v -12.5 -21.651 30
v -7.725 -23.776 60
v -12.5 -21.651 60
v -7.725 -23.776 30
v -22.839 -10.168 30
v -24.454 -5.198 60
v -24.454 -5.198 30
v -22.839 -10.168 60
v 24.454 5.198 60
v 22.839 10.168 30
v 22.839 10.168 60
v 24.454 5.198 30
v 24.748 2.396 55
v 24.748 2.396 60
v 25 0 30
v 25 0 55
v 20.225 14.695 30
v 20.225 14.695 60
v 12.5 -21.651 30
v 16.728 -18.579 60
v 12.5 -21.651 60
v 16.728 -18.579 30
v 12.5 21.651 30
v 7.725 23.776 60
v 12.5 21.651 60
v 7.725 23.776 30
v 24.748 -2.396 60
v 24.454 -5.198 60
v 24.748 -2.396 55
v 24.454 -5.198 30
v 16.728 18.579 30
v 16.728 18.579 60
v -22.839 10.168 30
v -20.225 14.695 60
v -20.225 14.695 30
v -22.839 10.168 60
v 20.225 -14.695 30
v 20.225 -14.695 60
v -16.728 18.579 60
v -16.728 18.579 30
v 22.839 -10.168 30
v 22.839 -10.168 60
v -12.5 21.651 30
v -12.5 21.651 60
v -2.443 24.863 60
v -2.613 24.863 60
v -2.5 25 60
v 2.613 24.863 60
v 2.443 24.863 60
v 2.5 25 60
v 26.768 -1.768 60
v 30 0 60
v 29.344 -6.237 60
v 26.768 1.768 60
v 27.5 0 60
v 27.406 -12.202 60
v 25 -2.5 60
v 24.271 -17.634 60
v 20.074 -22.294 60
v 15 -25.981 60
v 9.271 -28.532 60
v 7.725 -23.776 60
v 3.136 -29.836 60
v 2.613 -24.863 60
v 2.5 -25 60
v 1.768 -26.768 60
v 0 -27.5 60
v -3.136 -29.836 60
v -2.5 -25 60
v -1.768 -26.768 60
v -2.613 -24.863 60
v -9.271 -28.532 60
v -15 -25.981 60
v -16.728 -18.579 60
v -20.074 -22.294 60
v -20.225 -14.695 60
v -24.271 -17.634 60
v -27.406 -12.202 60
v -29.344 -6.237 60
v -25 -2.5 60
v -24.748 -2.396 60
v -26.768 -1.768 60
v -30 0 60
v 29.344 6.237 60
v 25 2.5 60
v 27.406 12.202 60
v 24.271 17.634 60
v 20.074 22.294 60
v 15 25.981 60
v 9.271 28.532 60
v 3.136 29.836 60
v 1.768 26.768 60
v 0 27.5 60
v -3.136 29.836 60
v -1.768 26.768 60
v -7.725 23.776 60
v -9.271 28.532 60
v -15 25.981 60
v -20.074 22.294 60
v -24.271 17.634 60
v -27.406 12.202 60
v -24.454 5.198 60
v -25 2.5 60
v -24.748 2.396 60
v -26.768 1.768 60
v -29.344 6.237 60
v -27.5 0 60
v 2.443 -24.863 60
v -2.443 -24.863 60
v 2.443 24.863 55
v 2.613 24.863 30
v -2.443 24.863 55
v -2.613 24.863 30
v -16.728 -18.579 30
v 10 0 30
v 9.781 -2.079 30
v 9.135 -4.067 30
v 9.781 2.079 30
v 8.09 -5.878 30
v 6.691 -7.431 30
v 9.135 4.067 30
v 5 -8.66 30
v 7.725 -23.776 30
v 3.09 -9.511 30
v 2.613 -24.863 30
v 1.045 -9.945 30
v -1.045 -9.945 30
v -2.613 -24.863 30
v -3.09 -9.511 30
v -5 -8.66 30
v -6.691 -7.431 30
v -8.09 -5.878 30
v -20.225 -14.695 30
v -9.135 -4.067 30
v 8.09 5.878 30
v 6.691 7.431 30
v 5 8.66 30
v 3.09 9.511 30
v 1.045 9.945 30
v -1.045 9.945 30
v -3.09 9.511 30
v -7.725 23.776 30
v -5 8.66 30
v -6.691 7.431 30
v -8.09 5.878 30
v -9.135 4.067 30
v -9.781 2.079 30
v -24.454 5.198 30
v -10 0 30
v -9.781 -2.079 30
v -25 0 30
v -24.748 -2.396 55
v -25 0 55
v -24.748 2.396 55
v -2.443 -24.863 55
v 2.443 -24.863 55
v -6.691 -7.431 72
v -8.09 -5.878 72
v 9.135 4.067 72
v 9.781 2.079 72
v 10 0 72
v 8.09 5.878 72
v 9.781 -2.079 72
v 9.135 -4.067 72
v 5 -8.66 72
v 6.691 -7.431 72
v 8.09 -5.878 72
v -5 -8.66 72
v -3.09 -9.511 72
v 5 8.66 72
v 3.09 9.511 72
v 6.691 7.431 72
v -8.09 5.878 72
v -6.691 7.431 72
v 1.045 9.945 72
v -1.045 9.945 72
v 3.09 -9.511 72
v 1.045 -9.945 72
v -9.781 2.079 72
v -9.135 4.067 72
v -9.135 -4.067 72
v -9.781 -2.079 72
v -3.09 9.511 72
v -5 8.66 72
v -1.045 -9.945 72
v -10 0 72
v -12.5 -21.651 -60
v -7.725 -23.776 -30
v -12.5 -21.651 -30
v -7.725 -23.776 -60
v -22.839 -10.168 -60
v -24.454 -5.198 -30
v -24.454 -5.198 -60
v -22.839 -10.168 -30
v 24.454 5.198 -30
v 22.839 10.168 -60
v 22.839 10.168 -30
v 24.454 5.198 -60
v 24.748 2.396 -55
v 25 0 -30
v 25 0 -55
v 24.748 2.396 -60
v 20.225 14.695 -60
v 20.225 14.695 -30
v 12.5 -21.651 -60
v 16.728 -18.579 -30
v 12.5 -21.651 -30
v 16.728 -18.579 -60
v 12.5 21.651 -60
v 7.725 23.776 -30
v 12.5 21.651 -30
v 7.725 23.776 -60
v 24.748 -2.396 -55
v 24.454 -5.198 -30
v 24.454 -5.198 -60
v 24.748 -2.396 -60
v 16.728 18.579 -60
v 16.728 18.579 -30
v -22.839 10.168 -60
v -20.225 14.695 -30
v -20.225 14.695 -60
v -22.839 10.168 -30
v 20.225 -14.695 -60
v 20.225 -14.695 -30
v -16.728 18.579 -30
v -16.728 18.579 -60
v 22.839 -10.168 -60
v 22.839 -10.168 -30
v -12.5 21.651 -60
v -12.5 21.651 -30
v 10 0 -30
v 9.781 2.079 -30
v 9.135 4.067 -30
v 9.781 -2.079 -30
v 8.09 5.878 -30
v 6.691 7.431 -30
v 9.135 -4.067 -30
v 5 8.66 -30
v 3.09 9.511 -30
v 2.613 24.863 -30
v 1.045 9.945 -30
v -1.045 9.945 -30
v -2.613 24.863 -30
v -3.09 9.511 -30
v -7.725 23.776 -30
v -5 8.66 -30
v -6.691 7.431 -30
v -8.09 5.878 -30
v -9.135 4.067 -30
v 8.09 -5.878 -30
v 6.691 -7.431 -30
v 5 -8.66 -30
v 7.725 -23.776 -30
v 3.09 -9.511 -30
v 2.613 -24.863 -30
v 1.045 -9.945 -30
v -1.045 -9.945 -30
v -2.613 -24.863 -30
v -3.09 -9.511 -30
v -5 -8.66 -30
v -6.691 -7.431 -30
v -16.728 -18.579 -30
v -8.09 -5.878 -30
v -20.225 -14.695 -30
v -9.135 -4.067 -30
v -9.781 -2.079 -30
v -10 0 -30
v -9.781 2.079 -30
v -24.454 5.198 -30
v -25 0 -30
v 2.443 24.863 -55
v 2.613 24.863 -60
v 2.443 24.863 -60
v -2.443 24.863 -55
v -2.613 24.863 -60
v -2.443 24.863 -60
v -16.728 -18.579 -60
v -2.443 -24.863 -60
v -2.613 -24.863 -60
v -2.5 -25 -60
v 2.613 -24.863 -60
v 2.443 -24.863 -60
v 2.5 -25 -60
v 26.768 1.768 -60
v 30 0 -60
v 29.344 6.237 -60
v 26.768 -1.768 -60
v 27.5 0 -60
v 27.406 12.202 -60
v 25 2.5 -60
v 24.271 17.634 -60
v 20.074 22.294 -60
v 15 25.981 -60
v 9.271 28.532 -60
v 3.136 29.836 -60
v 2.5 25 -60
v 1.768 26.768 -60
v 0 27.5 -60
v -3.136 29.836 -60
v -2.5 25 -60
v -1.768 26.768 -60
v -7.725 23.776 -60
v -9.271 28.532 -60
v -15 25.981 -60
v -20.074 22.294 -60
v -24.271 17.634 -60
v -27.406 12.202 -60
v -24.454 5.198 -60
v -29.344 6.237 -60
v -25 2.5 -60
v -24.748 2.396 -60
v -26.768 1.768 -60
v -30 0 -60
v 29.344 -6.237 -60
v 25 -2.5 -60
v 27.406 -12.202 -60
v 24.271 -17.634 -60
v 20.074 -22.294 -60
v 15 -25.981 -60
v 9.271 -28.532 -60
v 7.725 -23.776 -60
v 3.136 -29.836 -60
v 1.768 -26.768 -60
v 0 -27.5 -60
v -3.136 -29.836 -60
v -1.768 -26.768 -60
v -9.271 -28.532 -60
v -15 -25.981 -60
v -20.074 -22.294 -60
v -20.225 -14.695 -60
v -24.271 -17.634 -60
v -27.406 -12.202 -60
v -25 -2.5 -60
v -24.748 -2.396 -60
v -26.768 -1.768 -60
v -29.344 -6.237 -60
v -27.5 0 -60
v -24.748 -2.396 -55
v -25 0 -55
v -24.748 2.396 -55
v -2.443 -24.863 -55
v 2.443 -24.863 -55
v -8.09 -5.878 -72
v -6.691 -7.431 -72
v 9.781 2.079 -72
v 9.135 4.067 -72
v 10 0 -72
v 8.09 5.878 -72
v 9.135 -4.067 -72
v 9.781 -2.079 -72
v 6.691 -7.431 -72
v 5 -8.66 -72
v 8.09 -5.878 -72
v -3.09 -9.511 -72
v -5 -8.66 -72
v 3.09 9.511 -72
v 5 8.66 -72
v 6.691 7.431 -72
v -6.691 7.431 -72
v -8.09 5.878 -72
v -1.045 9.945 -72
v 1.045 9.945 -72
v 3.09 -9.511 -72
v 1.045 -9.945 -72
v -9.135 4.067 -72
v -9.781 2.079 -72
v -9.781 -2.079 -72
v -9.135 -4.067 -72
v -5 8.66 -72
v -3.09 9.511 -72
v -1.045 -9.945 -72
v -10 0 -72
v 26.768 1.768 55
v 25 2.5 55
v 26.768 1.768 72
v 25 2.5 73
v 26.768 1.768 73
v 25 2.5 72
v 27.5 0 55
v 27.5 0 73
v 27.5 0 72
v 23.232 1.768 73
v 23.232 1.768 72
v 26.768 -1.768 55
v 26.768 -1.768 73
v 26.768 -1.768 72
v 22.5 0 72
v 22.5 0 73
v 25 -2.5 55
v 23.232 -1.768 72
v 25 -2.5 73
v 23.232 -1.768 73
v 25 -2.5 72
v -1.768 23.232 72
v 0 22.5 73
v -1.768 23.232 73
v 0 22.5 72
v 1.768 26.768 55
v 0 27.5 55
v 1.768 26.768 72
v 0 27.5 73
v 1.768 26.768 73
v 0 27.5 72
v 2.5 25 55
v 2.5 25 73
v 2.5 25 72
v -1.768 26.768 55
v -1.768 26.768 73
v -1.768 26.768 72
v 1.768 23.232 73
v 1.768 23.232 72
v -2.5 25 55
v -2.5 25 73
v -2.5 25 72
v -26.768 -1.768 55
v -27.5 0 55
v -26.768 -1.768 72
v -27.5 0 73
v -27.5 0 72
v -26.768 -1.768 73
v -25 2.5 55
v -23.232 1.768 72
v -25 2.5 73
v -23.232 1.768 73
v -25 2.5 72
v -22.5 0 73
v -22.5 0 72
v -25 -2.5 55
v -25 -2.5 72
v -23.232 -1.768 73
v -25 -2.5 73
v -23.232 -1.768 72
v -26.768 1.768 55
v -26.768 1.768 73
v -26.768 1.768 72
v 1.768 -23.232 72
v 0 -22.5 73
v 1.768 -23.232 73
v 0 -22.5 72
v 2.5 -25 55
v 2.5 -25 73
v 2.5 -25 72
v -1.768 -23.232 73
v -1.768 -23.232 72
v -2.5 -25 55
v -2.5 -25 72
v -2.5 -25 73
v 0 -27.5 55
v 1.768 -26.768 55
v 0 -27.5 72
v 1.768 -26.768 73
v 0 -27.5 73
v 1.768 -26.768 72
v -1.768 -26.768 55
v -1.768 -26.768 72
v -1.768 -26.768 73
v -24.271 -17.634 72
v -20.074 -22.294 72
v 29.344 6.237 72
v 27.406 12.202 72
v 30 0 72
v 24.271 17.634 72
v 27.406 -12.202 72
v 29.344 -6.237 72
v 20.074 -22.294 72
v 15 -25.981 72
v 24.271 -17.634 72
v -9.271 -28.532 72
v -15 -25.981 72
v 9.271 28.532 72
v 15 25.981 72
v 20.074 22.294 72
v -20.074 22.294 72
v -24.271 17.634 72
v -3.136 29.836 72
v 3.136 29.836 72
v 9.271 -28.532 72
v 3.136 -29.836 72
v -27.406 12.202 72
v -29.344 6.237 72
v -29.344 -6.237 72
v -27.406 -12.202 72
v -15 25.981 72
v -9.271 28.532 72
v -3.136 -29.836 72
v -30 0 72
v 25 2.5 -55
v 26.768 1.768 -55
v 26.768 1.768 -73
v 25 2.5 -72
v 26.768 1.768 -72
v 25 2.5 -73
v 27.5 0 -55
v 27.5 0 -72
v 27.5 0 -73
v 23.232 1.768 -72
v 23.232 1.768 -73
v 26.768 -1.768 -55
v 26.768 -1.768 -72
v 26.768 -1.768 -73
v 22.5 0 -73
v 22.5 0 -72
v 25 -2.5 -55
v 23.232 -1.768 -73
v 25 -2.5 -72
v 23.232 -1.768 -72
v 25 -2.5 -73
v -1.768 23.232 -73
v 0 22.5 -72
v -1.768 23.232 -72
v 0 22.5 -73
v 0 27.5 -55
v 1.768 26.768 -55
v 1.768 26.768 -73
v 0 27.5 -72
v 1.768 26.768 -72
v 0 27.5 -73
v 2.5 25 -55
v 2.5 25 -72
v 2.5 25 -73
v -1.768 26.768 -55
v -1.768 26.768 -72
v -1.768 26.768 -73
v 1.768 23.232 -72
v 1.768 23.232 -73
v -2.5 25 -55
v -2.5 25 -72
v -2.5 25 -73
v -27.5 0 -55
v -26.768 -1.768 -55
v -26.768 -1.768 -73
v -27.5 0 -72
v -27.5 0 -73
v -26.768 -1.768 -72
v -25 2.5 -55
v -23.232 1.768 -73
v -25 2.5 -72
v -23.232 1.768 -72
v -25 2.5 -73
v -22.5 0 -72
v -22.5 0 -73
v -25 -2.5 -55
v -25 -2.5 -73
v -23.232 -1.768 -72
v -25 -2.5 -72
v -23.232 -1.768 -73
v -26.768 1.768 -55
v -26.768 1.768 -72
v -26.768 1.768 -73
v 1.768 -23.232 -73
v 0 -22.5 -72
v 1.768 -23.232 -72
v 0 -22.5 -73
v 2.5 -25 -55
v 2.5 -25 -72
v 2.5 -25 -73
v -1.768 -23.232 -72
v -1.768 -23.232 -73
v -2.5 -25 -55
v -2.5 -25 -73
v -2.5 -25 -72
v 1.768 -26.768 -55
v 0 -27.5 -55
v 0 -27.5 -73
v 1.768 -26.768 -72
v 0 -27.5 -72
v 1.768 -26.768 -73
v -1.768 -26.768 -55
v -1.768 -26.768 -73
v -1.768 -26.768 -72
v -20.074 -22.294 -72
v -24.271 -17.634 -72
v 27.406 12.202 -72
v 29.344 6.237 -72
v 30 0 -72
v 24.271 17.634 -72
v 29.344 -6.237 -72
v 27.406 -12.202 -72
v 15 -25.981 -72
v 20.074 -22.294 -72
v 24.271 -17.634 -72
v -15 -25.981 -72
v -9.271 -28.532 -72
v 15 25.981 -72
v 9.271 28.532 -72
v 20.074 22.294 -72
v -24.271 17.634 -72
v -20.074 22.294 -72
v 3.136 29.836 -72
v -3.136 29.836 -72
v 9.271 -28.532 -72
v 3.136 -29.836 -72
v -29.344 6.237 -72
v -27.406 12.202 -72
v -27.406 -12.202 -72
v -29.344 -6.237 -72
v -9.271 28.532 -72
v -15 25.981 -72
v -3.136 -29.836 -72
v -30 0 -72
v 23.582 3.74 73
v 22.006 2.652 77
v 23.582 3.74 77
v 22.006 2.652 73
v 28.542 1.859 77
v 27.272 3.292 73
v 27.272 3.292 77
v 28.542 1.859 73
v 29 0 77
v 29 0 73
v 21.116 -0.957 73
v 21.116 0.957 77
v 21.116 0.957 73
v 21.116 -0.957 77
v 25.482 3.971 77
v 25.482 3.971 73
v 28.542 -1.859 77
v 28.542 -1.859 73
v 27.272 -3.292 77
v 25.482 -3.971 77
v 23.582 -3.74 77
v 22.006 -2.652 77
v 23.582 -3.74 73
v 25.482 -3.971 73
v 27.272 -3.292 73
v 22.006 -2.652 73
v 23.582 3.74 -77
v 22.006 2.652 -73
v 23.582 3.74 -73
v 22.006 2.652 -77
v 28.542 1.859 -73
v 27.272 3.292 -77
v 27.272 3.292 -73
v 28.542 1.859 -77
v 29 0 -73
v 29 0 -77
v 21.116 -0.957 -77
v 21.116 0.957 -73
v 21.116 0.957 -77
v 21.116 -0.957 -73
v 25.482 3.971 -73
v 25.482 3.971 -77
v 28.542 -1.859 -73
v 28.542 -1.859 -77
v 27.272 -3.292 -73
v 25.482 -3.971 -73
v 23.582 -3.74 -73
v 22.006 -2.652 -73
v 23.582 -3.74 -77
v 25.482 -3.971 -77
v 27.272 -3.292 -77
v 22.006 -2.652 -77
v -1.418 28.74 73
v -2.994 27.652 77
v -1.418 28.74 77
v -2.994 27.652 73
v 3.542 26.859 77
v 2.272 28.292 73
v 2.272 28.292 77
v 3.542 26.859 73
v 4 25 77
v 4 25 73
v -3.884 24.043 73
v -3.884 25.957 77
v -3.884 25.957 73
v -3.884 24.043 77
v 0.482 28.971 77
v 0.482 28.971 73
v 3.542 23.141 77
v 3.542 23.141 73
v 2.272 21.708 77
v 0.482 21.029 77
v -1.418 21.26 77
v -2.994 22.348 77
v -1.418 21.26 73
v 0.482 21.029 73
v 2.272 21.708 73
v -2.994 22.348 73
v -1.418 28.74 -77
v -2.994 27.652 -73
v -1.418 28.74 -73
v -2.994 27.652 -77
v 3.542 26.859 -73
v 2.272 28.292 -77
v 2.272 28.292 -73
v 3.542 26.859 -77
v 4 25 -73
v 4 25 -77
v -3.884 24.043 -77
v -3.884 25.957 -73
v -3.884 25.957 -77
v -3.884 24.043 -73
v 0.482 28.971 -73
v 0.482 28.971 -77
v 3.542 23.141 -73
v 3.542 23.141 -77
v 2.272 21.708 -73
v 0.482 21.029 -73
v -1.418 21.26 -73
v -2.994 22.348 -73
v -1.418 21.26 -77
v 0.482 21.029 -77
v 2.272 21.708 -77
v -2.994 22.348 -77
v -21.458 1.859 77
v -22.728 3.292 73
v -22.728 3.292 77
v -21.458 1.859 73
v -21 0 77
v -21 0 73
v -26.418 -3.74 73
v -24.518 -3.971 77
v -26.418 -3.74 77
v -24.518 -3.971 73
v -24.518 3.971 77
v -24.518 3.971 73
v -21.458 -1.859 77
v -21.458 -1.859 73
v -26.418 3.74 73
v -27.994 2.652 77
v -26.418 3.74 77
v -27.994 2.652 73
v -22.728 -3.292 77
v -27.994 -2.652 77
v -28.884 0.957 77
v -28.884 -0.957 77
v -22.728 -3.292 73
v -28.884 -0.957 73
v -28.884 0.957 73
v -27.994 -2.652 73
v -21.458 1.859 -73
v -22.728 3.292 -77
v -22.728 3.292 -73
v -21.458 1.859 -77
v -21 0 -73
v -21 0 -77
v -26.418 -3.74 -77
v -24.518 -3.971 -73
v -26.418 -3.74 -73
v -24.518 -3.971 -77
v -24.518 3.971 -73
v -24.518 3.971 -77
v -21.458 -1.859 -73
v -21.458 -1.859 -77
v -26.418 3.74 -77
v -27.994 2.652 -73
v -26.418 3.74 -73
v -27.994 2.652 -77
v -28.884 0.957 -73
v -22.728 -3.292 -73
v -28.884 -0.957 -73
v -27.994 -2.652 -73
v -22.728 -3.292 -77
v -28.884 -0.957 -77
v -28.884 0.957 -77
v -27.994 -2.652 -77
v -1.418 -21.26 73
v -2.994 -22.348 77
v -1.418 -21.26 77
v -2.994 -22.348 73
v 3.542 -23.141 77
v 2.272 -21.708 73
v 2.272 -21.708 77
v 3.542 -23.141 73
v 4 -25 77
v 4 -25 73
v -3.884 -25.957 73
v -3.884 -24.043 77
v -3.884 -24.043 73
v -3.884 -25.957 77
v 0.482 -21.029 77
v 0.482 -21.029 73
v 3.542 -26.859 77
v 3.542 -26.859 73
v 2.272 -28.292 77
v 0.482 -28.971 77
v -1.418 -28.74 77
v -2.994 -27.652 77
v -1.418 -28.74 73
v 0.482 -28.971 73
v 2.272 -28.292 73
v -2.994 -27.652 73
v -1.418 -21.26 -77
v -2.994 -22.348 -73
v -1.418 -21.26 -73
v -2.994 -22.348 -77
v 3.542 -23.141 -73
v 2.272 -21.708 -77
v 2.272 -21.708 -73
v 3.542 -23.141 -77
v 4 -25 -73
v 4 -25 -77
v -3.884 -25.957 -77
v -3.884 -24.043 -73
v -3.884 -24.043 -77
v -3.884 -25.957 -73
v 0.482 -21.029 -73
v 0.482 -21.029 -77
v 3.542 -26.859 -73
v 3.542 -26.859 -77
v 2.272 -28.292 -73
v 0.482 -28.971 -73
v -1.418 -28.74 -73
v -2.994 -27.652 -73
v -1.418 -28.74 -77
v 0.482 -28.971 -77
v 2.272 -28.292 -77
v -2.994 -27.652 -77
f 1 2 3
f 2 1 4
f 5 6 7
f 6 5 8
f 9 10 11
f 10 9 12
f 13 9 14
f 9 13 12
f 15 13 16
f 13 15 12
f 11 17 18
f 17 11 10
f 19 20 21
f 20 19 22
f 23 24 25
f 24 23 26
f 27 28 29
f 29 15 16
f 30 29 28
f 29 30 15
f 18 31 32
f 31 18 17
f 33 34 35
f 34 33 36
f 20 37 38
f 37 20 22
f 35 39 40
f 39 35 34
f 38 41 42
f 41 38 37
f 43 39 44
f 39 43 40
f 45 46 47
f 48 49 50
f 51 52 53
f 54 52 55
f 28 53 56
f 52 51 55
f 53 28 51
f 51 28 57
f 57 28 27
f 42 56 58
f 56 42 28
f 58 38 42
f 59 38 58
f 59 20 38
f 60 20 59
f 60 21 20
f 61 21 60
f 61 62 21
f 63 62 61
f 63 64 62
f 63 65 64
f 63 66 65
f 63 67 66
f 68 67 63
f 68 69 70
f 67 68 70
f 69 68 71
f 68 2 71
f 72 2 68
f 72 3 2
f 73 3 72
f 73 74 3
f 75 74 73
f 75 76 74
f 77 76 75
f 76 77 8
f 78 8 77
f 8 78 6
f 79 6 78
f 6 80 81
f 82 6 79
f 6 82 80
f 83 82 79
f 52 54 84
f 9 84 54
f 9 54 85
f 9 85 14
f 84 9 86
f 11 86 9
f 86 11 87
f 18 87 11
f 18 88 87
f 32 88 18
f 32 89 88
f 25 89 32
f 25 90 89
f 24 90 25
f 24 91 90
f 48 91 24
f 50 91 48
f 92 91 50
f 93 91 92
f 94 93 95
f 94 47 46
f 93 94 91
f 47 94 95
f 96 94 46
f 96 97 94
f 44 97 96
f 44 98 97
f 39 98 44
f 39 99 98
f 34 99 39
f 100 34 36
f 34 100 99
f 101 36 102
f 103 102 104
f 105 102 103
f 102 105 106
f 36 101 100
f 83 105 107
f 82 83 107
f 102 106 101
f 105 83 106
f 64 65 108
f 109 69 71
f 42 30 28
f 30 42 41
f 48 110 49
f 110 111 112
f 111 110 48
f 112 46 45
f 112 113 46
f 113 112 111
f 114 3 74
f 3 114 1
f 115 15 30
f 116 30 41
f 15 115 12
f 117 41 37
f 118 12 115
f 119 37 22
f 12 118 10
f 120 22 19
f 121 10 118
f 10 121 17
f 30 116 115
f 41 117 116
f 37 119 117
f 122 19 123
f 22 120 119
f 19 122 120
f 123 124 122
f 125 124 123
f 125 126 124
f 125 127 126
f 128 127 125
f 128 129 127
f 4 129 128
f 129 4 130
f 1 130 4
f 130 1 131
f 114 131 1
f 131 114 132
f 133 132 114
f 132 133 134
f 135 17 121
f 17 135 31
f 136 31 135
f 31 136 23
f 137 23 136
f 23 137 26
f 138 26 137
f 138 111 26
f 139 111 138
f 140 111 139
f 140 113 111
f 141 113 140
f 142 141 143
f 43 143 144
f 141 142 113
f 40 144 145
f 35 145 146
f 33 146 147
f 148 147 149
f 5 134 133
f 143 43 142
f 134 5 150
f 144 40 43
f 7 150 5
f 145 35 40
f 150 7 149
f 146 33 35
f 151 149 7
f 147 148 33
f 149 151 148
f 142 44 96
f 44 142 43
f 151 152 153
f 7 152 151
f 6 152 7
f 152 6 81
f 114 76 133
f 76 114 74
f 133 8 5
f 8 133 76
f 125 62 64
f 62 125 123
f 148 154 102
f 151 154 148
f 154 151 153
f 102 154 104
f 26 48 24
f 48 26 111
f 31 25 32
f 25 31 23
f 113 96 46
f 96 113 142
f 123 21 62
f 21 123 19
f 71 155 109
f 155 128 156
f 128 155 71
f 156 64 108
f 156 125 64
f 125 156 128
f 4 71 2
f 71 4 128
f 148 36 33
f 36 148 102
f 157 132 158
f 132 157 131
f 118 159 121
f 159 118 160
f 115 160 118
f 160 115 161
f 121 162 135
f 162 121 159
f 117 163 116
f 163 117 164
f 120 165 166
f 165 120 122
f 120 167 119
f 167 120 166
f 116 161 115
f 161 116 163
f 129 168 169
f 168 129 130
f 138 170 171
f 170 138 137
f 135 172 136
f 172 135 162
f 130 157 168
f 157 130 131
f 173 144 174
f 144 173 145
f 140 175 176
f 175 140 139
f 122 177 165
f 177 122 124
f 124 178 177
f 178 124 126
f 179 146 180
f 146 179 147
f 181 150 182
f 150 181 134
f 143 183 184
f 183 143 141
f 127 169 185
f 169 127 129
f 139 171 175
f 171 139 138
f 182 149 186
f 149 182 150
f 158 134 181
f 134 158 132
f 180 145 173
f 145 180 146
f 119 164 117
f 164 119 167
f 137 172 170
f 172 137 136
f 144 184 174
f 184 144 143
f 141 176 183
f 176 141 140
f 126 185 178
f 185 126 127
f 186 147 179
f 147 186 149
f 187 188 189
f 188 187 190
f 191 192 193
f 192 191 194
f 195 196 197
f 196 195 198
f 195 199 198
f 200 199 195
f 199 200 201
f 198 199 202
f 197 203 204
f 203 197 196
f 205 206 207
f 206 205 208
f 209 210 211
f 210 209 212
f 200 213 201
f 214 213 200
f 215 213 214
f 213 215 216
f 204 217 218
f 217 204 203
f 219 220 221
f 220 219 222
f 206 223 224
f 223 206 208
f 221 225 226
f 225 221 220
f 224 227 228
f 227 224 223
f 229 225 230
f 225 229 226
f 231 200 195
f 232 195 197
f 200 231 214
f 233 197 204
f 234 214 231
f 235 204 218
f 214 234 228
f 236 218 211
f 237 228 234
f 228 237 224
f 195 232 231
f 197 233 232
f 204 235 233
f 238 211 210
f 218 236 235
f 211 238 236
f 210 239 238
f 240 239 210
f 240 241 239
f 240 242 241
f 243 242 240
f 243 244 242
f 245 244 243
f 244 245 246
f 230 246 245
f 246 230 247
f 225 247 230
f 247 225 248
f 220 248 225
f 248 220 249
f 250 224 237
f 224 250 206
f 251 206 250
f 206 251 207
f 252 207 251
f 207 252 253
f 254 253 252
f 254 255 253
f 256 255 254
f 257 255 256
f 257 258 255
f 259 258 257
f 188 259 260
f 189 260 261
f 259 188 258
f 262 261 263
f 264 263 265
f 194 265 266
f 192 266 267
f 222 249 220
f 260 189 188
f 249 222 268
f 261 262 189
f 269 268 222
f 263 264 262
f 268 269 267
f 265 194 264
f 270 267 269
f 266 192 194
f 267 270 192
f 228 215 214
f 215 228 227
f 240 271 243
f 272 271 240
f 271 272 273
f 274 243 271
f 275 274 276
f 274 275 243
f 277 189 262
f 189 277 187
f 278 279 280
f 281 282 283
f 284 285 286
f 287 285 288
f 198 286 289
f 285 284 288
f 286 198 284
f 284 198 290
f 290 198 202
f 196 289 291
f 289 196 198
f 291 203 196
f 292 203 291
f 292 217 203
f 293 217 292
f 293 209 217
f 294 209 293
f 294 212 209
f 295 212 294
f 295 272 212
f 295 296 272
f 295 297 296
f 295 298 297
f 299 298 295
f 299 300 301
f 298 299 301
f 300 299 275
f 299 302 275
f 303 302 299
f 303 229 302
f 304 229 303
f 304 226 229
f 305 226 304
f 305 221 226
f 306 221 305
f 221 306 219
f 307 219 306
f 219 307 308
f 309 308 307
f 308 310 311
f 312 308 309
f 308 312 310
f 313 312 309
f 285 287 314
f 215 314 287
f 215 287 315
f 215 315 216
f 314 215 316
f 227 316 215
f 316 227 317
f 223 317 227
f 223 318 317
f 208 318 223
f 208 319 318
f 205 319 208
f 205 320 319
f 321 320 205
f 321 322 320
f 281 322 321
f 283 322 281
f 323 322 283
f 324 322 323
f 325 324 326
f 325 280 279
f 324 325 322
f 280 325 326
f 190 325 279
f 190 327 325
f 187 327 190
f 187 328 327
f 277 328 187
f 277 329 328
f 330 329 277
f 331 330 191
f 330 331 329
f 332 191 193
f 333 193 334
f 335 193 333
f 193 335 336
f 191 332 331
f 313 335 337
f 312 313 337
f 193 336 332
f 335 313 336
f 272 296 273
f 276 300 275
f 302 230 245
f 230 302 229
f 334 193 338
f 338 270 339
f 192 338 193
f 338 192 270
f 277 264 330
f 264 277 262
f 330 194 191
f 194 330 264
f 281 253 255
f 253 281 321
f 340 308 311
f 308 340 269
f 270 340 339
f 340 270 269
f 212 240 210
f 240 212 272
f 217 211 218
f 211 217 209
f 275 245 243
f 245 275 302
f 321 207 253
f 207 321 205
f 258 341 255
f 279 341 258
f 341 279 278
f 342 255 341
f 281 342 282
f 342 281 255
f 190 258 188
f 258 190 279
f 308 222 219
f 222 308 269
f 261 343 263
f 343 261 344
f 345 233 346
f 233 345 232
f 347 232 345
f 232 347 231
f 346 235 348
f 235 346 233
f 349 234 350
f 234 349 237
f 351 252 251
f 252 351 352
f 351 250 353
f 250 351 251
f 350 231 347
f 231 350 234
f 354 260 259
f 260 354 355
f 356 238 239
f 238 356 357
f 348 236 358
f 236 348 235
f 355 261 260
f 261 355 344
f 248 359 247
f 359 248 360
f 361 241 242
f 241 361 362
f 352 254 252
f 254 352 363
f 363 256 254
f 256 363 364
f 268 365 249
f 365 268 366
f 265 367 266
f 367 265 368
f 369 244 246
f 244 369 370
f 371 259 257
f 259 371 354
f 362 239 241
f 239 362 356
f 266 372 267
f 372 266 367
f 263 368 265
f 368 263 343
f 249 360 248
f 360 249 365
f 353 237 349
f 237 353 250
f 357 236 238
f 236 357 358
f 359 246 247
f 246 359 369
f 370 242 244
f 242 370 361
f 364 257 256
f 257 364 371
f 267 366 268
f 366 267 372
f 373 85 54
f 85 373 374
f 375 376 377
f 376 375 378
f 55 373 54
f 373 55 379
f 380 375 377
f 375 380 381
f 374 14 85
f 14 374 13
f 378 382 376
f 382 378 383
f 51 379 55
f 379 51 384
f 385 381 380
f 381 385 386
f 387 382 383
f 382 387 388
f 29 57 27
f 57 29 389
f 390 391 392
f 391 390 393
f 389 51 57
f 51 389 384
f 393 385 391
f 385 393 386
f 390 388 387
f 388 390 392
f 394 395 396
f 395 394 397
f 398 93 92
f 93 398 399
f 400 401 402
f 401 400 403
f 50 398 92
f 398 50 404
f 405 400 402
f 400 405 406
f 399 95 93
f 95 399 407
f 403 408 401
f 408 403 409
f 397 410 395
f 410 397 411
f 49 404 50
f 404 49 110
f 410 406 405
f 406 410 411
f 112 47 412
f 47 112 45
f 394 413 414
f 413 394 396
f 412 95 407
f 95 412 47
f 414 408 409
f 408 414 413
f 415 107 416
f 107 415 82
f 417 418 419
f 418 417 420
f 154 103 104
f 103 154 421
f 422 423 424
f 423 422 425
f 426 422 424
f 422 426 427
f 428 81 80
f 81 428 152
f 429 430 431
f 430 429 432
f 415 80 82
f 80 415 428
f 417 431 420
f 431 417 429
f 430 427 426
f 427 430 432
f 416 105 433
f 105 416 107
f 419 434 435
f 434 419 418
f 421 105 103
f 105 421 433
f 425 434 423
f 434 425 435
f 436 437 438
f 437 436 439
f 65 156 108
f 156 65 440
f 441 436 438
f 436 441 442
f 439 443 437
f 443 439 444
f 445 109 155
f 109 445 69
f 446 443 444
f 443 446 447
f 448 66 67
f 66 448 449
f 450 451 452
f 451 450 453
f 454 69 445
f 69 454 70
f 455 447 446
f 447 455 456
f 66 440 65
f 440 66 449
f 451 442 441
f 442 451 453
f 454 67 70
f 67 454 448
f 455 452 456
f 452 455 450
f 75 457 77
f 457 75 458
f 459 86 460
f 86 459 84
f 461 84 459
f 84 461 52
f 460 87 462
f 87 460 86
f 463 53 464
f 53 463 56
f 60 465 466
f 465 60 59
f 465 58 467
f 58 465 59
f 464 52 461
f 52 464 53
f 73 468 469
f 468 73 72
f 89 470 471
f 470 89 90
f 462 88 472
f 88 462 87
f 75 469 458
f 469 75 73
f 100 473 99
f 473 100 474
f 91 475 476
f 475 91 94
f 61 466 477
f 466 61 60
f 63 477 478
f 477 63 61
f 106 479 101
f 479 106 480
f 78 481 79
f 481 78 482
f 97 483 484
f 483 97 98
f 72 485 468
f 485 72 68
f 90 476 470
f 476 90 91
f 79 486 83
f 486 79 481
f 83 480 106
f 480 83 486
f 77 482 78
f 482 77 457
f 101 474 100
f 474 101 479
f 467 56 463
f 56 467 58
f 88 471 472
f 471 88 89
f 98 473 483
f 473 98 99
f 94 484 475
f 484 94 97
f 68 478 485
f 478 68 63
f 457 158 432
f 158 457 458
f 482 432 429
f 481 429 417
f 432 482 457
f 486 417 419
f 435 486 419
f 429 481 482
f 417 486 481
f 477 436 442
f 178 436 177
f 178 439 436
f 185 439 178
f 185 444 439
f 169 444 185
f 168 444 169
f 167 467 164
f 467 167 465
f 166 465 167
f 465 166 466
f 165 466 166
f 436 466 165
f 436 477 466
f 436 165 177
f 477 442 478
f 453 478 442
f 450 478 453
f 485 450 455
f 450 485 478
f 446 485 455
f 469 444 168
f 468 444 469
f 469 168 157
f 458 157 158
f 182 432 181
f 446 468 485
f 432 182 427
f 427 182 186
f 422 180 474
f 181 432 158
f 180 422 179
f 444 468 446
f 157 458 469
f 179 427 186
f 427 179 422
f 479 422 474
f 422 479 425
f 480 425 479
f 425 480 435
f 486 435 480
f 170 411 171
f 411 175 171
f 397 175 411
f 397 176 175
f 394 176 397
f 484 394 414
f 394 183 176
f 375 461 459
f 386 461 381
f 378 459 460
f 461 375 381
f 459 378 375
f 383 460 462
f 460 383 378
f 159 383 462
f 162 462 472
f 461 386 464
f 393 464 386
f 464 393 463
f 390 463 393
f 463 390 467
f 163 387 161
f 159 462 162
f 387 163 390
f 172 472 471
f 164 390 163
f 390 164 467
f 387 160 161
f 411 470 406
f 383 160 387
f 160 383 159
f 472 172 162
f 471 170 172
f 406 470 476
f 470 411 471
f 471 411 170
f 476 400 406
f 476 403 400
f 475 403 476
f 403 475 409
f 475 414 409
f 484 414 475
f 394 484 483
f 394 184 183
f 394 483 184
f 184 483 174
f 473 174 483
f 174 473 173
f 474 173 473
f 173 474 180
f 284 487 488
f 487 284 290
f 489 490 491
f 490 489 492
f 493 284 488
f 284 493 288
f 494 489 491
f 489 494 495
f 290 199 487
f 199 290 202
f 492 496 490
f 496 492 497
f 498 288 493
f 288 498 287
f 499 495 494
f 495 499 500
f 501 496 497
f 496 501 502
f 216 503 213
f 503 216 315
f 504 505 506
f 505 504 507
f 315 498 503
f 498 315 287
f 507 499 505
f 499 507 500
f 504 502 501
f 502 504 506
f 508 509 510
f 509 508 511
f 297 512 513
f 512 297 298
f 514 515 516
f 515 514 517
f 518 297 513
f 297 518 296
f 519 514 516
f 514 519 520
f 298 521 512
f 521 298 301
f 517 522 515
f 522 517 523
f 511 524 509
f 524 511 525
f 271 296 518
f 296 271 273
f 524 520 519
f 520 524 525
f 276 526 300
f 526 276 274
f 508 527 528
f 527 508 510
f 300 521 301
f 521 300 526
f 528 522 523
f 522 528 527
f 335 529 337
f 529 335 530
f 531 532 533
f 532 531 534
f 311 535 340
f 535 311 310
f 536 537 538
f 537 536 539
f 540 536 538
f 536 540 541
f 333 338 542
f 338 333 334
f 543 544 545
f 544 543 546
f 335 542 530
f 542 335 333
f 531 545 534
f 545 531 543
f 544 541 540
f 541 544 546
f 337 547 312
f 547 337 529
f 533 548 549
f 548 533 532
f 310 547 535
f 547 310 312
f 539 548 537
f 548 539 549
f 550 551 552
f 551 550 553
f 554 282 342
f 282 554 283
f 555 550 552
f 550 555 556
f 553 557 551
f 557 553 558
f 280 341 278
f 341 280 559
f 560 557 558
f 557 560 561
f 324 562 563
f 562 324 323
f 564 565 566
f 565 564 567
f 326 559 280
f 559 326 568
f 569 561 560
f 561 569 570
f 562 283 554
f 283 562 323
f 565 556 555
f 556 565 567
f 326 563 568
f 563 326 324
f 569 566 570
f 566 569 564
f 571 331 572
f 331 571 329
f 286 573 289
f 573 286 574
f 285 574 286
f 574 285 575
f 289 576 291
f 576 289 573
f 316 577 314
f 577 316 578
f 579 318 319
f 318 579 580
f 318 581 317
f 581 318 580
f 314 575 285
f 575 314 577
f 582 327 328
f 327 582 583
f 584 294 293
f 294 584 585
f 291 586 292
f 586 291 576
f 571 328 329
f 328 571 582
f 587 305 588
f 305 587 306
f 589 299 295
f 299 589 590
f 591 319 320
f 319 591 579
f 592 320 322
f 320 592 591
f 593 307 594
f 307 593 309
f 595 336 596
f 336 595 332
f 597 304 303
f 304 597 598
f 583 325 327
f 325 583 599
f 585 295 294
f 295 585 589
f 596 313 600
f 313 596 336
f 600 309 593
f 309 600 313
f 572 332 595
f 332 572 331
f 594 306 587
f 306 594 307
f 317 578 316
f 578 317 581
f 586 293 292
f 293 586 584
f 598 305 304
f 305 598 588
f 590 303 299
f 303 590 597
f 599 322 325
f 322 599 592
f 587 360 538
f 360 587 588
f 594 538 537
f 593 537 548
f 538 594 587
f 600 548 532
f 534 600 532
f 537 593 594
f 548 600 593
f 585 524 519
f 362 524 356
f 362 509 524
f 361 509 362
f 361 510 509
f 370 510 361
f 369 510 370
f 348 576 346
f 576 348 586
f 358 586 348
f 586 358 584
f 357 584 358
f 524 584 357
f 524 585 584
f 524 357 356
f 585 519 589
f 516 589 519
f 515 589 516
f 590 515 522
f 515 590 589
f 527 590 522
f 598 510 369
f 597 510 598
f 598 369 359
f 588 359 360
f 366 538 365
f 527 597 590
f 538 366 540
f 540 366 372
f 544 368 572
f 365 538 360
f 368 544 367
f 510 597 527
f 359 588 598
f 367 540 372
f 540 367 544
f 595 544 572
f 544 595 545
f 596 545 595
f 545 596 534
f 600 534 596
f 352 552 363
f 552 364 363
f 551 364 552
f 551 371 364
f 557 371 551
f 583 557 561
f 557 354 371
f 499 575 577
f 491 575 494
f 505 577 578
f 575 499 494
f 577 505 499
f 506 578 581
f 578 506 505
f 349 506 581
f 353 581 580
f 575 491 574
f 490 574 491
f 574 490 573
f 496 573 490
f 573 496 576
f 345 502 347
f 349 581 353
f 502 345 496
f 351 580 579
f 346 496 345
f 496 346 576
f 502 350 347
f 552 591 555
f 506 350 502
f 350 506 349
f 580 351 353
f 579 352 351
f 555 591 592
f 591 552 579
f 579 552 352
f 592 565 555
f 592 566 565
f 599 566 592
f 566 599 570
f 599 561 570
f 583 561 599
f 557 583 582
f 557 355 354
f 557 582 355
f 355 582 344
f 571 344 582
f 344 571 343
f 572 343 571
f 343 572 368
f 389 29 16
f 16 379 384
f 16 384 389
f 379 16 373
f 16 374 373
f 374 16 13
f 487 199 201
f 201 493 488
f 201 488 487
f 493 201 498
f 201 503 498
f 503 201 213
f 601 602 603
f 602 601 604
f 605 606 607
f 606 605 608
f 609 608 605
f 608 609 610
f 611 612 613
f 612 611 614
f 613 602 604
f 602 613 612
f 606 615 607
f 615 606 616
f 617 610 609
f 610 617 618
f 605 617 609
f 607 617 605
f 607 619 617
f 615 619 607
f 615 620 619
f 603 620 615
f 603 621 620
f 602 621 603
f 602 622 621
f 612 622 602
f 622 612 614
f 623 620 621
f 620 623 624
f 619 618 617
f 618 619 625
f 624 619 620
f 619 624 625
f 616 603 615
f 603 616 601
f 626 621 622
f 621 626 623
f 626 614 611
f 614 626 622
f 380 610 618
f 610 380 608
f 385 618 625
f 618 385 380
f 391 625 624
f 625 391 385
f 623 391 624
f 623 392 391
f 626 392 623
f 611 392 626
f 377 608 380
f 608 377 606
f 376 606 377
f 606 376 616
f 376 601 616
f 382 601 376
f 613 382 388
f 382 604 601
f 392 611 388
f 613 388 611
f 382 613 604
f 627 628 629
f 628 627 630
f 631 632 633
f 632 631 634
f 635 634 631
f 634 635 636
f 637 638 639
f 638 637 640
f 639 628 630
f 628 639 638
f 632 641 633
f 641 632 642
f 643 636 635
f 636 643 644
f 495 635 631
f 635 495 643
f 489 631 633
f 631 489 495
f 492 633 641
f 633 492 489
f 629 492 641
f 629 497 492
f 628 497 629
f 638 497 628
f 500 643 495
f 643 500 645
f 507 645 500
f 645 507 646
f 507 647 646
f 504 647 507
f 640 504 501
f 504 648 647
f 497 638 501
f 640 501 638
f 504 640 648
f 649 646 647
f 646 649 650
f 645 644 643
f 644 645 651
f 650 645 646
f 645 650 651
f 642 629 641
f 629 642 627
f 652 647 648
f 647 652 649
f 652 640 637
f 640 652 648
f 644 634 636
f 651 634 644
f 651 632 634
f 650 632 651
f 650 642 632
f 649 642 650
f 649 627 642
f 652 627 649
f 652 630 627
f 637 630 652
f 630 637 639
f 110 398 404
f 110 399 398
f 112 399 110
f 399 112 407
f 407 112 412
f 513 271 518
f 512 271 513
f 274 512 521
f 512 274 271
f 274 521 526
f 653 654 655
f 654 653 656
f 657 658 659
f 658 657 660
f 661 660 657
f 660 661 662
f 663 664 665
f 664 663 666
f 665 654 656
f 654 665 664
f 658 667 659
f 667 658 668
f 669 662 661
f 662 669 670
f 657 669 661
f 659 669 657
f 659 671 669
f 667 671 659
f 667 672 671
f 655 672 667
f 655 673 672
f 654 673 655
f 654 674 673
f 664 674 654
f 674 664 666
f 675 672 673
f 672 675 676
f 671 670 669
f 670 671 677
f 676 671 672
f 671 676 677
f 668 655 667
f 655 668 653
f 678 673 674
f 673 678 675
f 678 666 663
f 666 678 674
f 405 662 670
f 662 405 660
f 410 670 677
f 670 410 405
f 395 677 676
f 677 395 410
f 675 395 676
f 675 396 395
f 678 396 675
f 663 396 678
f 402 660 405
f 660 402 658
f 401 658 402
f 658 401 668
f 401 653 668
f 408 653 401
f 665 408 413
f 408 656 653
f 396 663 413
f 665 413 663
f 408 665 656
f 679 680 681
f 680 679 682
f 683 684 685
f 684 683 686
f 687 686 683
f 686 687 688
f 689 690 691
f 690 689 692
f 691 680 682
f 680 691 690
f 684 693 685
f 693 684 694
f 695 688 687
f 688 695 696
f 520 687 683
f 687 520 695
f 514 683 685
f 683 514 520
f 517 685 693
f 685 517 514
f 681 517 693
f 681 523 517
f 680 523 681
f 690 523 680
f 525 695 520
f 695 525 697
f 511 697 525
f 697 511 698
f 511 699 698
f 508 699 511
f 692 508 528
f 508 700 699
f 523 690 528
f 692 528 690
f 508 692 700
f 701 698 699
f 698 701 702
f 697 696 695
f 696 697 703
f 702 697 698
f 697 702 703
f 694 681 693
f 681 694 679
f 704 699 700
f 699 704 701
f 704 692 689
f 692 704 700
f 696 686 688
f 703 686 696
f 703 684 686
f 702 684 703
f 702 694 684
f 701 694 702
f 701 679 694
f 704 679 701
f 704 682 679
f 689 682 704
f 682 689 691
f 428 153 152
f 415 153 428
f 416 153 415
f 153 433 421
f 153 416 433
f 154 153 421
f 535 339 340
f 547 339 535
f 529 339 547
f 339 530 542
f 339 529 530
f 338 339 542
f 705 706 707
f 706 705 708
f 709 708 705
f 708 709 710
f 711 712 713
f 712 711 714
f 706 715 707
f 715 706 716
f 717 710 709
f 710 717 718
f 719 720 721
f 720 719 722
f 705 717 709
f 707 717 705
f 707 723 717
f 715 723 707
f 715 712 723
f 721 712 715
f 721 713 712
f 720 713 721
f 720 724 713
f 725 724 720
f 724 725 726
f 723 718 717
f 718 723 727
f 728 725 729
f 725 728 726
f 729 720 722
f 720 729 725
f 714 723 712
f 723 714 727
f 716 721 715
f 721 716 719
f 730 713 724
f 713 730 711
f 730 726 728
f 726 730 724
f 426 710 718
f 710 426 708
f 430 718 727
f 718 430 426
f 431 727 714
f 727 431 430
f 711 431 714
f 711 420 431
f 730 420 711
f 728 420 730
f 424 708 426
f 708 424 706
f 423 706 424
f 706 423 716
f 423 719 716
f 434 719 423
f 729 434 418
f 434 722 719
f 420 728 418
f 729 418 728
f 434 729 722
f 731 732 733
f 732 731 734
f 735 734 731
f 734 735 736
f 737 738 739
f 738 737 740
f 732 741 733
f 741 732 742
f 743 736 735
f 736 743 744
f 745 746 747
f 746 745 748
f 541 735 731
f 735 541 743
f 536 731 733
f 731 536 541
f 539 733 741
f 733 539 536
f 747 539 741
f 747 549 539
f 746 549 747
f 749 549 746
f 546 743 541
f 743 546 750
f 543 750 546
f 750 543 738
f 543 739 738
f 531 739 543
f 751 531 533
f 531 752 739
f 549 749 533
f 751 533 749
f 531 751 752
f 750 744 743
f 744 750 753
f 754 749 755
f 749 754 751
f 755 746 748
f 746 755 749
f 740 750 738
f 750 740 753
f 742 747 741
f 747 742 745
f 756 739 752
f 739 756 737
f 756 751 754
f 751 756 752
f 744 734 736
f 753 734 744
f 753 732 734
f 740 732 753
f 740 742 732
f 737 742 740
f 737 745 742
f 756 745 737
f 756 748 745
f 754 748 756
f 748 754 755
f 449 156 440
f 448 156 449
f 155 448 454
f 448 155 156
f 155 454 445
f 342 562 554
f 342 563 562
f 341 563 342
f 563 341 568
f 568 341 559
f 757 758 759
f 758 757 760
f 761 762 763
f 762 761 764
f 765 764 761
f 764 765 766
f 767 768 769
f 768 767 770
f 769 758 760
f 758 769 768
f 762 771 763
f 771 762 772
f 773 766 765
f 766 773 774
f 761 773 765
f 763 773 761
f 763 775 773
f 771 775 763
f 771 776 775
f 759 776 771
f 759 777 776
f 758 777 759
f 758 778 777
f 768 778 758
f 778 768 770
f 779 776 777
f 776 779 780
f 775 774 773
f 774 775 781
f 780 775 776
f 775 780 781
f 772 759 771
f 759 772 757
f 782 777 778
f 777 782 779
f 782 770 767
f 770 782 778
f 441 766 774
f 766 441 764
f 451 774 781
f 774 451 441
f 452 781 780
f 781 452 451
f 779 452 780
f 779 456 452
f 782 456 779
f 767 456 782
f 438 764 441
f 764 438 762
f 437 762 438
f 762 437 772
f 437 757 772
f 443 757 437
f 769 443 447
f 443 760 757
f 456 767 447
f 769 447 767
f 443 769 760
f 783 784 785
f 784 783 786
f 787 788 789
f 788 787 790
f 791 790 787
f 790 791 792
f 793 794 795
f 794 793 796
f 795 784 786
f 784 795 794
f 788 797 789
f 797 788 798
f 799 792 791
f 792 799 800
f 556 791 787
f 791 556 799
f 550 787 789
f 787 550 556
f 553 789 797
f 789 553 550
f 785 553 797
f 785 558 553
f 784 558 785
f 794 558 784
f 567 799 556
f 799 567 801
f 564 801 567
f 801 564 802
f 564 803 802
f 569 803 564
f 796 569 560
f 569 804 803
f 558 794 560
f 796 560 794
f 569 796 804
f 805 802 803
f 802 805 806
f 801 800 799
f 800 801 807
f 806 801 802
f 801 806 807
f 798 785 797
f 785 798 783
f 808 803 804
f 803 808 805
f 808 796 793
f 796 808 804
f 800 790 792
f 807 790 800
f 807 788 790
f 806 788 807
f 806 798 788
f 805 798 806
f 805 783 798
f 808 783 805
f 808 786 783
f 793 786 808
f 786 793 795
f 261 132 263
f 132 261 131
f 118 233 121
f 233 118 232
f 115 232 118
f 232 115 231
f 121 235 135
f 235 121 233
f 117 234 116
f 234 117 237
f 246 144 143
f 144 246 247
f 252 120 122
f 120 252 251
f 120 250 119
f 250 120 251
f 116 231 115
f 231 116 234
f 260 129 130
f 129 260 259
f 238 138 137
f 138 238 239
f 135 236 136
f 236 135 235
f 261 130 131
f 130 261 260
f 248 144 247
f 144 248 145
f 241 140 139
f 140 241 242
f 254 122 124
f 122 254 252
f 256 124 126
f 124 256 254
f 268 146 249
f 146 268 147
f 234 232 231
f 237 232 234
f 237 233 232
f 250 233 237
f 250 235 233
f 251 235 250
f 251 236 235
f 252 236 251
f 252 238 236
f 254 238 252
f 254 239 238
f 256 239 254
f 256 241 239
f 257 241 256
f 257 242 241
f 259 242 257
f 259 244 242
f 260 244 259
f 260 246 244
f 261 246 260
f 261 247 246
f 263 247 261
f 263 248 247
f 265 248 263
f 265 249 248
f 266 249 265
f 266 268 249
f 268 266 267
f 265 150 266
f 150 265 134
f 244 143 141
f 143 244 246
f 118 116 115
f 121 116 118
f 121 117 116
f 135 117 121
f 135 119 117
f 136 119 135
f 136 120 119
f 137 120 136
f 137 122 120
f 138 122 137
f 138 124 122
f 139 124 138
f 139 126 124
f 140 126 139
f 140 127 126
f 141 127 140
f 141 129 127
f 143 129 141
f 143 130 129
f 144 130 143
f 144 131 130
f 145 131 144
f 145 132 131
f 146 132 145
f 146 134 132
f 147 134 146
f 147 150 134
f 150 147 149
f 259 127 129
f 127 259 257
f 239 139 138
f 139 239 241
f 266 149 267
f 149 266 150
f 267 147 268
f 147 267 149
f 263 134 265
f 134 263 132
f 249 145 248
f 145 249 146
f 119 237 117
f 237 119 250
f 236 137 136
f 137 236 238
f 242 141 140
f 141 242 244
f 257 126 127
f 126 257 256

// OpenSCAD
// Parameters
shaft_diameter = 20;
shaft_length = 60;
hub_diameter = 50;
hub_length = 30;
flange_diameter = 60;
flange_thickness = 5;
spacer_ring_thickness = 2;
bolt_diameter = 5;
bolt_length = 20;
nut_diameter = 8;
nut_thickness = 4;
bolt_hole_radius = 25;
num_bolts = 4;

// Central Shaft
module central_shaft() {
    cylinder(d=shaft_diameter, h=shaft_length, center=true);
}

// Hub
module hub() {
    difference() {
        cylinder(d=hub_diameter, h=hub_length, center=true);
        cylinder(d=shaft_diameter, h=hub_length + 2, center=true);
    }
}

// Flange Plate
module flange_plate() {
    difference() {
        cylinder(d=flange_diameter, h=flange_thickness, center=true);
        cylinder(d=shaft_diameter, h=flange_thickness + 2, center=true);
        for (i = [0:num_bolts-1]) {
            angle = i * 360 / num_bolts;
            translate([bolt_hole_radius * cos(angle), bolt_hole_radius * sin(angle), 0])
                cylinder(d=bolt_diameter, h=flange_thickness + 2, center=true);
        }
    }
}

// Spacer Ring
module spacer_ring() {
    difference() {
        cylinder(d=flange_diameter, h=spacer_ring_thickness, center=true);
        cylinder(d=shaft_diameter, h=spacer_ring_thickness + 2, center=true);
        for (i = [0:num_bolts-1]) {
            angle = i * 360 / num_bolts;
            translate([bolt_hole_radius * cos(angle), bolt_hole_radius * sin(angle), 0])
                cylinder(d=bolt_diameter, h=spacer_ring_thickness + 2, center=true);
        }
    }
}

// Bolt
module bolt() {
    cylinder(d=bolt_diameter, h=bolt_length, center=true);
}

// Nut
module nut() {
    cylinder(d=nut_diameter, h=nut_thickness, center=true);
}

// Assembly
module coupling() {
    translate([0, 0, shaft_length / 2 + hub_length / 2]) hub();
    translate([0, 0, -shaft_length / 2 - hub_length / 2]) hub();
    
    translate([0, 0, shaft_length / 2 + hub_length + flange_thickness / 2]) flange_plate();
    translate([0, 0, shaft_length / 2 + hub_length + flange_thickness + spacer_ring_thickness / 2]) spacer_ring();
    translate([0, 0, shaft_length / 2 + hub_length + flange_thickness + spacer_ring_thickness + flange_thickness / 2]) flange_plate();
    
    translate([0, 0, -shaft_length / 2 - hub_length - flange_thickness / 2]) flange_plate();
    translate([0, 0, -shaft_length / 2 - hub_length - flange_thickness - spacer_ring_thickness / 2]) spacer_ring();
    translate([0, 0, -shaft_length / 2 - hub_length - flange_thickness - spacer_ring_thickness - flange_thickness / 2]) flange_plate();
    
    for (i = [0:num_bolts-1]) {
        angle = i * 360 / num_bolts;
        translate([bolt_hole_radius * cos(angle), bolt_hole_radius * sin(angle), shaft_length / 2 + hub_length + flange_thickness])
            bolt();
        translate([bolt_hole_radius * cos(angle), bolt_hole_radius * sin(angle), -shaft_length / 2 - hub_length - flange_thickness])
            bolt();
        
        translate([bolt_hole_radius * cos(angle), bolt_hole_radius * sin(angle), shaft_length / 2 + hub_length + flange_thickness + bolt_length / 2])
            nut();
        translate([bolt_hole_radius * cos(angle), bolt_hole_radius * sin(angle), -shaft_length / 2 - hub_length - flange_thickness - bolt_length / 2])
            nut();
    }
    
    central_shaft();
}

coupling();
